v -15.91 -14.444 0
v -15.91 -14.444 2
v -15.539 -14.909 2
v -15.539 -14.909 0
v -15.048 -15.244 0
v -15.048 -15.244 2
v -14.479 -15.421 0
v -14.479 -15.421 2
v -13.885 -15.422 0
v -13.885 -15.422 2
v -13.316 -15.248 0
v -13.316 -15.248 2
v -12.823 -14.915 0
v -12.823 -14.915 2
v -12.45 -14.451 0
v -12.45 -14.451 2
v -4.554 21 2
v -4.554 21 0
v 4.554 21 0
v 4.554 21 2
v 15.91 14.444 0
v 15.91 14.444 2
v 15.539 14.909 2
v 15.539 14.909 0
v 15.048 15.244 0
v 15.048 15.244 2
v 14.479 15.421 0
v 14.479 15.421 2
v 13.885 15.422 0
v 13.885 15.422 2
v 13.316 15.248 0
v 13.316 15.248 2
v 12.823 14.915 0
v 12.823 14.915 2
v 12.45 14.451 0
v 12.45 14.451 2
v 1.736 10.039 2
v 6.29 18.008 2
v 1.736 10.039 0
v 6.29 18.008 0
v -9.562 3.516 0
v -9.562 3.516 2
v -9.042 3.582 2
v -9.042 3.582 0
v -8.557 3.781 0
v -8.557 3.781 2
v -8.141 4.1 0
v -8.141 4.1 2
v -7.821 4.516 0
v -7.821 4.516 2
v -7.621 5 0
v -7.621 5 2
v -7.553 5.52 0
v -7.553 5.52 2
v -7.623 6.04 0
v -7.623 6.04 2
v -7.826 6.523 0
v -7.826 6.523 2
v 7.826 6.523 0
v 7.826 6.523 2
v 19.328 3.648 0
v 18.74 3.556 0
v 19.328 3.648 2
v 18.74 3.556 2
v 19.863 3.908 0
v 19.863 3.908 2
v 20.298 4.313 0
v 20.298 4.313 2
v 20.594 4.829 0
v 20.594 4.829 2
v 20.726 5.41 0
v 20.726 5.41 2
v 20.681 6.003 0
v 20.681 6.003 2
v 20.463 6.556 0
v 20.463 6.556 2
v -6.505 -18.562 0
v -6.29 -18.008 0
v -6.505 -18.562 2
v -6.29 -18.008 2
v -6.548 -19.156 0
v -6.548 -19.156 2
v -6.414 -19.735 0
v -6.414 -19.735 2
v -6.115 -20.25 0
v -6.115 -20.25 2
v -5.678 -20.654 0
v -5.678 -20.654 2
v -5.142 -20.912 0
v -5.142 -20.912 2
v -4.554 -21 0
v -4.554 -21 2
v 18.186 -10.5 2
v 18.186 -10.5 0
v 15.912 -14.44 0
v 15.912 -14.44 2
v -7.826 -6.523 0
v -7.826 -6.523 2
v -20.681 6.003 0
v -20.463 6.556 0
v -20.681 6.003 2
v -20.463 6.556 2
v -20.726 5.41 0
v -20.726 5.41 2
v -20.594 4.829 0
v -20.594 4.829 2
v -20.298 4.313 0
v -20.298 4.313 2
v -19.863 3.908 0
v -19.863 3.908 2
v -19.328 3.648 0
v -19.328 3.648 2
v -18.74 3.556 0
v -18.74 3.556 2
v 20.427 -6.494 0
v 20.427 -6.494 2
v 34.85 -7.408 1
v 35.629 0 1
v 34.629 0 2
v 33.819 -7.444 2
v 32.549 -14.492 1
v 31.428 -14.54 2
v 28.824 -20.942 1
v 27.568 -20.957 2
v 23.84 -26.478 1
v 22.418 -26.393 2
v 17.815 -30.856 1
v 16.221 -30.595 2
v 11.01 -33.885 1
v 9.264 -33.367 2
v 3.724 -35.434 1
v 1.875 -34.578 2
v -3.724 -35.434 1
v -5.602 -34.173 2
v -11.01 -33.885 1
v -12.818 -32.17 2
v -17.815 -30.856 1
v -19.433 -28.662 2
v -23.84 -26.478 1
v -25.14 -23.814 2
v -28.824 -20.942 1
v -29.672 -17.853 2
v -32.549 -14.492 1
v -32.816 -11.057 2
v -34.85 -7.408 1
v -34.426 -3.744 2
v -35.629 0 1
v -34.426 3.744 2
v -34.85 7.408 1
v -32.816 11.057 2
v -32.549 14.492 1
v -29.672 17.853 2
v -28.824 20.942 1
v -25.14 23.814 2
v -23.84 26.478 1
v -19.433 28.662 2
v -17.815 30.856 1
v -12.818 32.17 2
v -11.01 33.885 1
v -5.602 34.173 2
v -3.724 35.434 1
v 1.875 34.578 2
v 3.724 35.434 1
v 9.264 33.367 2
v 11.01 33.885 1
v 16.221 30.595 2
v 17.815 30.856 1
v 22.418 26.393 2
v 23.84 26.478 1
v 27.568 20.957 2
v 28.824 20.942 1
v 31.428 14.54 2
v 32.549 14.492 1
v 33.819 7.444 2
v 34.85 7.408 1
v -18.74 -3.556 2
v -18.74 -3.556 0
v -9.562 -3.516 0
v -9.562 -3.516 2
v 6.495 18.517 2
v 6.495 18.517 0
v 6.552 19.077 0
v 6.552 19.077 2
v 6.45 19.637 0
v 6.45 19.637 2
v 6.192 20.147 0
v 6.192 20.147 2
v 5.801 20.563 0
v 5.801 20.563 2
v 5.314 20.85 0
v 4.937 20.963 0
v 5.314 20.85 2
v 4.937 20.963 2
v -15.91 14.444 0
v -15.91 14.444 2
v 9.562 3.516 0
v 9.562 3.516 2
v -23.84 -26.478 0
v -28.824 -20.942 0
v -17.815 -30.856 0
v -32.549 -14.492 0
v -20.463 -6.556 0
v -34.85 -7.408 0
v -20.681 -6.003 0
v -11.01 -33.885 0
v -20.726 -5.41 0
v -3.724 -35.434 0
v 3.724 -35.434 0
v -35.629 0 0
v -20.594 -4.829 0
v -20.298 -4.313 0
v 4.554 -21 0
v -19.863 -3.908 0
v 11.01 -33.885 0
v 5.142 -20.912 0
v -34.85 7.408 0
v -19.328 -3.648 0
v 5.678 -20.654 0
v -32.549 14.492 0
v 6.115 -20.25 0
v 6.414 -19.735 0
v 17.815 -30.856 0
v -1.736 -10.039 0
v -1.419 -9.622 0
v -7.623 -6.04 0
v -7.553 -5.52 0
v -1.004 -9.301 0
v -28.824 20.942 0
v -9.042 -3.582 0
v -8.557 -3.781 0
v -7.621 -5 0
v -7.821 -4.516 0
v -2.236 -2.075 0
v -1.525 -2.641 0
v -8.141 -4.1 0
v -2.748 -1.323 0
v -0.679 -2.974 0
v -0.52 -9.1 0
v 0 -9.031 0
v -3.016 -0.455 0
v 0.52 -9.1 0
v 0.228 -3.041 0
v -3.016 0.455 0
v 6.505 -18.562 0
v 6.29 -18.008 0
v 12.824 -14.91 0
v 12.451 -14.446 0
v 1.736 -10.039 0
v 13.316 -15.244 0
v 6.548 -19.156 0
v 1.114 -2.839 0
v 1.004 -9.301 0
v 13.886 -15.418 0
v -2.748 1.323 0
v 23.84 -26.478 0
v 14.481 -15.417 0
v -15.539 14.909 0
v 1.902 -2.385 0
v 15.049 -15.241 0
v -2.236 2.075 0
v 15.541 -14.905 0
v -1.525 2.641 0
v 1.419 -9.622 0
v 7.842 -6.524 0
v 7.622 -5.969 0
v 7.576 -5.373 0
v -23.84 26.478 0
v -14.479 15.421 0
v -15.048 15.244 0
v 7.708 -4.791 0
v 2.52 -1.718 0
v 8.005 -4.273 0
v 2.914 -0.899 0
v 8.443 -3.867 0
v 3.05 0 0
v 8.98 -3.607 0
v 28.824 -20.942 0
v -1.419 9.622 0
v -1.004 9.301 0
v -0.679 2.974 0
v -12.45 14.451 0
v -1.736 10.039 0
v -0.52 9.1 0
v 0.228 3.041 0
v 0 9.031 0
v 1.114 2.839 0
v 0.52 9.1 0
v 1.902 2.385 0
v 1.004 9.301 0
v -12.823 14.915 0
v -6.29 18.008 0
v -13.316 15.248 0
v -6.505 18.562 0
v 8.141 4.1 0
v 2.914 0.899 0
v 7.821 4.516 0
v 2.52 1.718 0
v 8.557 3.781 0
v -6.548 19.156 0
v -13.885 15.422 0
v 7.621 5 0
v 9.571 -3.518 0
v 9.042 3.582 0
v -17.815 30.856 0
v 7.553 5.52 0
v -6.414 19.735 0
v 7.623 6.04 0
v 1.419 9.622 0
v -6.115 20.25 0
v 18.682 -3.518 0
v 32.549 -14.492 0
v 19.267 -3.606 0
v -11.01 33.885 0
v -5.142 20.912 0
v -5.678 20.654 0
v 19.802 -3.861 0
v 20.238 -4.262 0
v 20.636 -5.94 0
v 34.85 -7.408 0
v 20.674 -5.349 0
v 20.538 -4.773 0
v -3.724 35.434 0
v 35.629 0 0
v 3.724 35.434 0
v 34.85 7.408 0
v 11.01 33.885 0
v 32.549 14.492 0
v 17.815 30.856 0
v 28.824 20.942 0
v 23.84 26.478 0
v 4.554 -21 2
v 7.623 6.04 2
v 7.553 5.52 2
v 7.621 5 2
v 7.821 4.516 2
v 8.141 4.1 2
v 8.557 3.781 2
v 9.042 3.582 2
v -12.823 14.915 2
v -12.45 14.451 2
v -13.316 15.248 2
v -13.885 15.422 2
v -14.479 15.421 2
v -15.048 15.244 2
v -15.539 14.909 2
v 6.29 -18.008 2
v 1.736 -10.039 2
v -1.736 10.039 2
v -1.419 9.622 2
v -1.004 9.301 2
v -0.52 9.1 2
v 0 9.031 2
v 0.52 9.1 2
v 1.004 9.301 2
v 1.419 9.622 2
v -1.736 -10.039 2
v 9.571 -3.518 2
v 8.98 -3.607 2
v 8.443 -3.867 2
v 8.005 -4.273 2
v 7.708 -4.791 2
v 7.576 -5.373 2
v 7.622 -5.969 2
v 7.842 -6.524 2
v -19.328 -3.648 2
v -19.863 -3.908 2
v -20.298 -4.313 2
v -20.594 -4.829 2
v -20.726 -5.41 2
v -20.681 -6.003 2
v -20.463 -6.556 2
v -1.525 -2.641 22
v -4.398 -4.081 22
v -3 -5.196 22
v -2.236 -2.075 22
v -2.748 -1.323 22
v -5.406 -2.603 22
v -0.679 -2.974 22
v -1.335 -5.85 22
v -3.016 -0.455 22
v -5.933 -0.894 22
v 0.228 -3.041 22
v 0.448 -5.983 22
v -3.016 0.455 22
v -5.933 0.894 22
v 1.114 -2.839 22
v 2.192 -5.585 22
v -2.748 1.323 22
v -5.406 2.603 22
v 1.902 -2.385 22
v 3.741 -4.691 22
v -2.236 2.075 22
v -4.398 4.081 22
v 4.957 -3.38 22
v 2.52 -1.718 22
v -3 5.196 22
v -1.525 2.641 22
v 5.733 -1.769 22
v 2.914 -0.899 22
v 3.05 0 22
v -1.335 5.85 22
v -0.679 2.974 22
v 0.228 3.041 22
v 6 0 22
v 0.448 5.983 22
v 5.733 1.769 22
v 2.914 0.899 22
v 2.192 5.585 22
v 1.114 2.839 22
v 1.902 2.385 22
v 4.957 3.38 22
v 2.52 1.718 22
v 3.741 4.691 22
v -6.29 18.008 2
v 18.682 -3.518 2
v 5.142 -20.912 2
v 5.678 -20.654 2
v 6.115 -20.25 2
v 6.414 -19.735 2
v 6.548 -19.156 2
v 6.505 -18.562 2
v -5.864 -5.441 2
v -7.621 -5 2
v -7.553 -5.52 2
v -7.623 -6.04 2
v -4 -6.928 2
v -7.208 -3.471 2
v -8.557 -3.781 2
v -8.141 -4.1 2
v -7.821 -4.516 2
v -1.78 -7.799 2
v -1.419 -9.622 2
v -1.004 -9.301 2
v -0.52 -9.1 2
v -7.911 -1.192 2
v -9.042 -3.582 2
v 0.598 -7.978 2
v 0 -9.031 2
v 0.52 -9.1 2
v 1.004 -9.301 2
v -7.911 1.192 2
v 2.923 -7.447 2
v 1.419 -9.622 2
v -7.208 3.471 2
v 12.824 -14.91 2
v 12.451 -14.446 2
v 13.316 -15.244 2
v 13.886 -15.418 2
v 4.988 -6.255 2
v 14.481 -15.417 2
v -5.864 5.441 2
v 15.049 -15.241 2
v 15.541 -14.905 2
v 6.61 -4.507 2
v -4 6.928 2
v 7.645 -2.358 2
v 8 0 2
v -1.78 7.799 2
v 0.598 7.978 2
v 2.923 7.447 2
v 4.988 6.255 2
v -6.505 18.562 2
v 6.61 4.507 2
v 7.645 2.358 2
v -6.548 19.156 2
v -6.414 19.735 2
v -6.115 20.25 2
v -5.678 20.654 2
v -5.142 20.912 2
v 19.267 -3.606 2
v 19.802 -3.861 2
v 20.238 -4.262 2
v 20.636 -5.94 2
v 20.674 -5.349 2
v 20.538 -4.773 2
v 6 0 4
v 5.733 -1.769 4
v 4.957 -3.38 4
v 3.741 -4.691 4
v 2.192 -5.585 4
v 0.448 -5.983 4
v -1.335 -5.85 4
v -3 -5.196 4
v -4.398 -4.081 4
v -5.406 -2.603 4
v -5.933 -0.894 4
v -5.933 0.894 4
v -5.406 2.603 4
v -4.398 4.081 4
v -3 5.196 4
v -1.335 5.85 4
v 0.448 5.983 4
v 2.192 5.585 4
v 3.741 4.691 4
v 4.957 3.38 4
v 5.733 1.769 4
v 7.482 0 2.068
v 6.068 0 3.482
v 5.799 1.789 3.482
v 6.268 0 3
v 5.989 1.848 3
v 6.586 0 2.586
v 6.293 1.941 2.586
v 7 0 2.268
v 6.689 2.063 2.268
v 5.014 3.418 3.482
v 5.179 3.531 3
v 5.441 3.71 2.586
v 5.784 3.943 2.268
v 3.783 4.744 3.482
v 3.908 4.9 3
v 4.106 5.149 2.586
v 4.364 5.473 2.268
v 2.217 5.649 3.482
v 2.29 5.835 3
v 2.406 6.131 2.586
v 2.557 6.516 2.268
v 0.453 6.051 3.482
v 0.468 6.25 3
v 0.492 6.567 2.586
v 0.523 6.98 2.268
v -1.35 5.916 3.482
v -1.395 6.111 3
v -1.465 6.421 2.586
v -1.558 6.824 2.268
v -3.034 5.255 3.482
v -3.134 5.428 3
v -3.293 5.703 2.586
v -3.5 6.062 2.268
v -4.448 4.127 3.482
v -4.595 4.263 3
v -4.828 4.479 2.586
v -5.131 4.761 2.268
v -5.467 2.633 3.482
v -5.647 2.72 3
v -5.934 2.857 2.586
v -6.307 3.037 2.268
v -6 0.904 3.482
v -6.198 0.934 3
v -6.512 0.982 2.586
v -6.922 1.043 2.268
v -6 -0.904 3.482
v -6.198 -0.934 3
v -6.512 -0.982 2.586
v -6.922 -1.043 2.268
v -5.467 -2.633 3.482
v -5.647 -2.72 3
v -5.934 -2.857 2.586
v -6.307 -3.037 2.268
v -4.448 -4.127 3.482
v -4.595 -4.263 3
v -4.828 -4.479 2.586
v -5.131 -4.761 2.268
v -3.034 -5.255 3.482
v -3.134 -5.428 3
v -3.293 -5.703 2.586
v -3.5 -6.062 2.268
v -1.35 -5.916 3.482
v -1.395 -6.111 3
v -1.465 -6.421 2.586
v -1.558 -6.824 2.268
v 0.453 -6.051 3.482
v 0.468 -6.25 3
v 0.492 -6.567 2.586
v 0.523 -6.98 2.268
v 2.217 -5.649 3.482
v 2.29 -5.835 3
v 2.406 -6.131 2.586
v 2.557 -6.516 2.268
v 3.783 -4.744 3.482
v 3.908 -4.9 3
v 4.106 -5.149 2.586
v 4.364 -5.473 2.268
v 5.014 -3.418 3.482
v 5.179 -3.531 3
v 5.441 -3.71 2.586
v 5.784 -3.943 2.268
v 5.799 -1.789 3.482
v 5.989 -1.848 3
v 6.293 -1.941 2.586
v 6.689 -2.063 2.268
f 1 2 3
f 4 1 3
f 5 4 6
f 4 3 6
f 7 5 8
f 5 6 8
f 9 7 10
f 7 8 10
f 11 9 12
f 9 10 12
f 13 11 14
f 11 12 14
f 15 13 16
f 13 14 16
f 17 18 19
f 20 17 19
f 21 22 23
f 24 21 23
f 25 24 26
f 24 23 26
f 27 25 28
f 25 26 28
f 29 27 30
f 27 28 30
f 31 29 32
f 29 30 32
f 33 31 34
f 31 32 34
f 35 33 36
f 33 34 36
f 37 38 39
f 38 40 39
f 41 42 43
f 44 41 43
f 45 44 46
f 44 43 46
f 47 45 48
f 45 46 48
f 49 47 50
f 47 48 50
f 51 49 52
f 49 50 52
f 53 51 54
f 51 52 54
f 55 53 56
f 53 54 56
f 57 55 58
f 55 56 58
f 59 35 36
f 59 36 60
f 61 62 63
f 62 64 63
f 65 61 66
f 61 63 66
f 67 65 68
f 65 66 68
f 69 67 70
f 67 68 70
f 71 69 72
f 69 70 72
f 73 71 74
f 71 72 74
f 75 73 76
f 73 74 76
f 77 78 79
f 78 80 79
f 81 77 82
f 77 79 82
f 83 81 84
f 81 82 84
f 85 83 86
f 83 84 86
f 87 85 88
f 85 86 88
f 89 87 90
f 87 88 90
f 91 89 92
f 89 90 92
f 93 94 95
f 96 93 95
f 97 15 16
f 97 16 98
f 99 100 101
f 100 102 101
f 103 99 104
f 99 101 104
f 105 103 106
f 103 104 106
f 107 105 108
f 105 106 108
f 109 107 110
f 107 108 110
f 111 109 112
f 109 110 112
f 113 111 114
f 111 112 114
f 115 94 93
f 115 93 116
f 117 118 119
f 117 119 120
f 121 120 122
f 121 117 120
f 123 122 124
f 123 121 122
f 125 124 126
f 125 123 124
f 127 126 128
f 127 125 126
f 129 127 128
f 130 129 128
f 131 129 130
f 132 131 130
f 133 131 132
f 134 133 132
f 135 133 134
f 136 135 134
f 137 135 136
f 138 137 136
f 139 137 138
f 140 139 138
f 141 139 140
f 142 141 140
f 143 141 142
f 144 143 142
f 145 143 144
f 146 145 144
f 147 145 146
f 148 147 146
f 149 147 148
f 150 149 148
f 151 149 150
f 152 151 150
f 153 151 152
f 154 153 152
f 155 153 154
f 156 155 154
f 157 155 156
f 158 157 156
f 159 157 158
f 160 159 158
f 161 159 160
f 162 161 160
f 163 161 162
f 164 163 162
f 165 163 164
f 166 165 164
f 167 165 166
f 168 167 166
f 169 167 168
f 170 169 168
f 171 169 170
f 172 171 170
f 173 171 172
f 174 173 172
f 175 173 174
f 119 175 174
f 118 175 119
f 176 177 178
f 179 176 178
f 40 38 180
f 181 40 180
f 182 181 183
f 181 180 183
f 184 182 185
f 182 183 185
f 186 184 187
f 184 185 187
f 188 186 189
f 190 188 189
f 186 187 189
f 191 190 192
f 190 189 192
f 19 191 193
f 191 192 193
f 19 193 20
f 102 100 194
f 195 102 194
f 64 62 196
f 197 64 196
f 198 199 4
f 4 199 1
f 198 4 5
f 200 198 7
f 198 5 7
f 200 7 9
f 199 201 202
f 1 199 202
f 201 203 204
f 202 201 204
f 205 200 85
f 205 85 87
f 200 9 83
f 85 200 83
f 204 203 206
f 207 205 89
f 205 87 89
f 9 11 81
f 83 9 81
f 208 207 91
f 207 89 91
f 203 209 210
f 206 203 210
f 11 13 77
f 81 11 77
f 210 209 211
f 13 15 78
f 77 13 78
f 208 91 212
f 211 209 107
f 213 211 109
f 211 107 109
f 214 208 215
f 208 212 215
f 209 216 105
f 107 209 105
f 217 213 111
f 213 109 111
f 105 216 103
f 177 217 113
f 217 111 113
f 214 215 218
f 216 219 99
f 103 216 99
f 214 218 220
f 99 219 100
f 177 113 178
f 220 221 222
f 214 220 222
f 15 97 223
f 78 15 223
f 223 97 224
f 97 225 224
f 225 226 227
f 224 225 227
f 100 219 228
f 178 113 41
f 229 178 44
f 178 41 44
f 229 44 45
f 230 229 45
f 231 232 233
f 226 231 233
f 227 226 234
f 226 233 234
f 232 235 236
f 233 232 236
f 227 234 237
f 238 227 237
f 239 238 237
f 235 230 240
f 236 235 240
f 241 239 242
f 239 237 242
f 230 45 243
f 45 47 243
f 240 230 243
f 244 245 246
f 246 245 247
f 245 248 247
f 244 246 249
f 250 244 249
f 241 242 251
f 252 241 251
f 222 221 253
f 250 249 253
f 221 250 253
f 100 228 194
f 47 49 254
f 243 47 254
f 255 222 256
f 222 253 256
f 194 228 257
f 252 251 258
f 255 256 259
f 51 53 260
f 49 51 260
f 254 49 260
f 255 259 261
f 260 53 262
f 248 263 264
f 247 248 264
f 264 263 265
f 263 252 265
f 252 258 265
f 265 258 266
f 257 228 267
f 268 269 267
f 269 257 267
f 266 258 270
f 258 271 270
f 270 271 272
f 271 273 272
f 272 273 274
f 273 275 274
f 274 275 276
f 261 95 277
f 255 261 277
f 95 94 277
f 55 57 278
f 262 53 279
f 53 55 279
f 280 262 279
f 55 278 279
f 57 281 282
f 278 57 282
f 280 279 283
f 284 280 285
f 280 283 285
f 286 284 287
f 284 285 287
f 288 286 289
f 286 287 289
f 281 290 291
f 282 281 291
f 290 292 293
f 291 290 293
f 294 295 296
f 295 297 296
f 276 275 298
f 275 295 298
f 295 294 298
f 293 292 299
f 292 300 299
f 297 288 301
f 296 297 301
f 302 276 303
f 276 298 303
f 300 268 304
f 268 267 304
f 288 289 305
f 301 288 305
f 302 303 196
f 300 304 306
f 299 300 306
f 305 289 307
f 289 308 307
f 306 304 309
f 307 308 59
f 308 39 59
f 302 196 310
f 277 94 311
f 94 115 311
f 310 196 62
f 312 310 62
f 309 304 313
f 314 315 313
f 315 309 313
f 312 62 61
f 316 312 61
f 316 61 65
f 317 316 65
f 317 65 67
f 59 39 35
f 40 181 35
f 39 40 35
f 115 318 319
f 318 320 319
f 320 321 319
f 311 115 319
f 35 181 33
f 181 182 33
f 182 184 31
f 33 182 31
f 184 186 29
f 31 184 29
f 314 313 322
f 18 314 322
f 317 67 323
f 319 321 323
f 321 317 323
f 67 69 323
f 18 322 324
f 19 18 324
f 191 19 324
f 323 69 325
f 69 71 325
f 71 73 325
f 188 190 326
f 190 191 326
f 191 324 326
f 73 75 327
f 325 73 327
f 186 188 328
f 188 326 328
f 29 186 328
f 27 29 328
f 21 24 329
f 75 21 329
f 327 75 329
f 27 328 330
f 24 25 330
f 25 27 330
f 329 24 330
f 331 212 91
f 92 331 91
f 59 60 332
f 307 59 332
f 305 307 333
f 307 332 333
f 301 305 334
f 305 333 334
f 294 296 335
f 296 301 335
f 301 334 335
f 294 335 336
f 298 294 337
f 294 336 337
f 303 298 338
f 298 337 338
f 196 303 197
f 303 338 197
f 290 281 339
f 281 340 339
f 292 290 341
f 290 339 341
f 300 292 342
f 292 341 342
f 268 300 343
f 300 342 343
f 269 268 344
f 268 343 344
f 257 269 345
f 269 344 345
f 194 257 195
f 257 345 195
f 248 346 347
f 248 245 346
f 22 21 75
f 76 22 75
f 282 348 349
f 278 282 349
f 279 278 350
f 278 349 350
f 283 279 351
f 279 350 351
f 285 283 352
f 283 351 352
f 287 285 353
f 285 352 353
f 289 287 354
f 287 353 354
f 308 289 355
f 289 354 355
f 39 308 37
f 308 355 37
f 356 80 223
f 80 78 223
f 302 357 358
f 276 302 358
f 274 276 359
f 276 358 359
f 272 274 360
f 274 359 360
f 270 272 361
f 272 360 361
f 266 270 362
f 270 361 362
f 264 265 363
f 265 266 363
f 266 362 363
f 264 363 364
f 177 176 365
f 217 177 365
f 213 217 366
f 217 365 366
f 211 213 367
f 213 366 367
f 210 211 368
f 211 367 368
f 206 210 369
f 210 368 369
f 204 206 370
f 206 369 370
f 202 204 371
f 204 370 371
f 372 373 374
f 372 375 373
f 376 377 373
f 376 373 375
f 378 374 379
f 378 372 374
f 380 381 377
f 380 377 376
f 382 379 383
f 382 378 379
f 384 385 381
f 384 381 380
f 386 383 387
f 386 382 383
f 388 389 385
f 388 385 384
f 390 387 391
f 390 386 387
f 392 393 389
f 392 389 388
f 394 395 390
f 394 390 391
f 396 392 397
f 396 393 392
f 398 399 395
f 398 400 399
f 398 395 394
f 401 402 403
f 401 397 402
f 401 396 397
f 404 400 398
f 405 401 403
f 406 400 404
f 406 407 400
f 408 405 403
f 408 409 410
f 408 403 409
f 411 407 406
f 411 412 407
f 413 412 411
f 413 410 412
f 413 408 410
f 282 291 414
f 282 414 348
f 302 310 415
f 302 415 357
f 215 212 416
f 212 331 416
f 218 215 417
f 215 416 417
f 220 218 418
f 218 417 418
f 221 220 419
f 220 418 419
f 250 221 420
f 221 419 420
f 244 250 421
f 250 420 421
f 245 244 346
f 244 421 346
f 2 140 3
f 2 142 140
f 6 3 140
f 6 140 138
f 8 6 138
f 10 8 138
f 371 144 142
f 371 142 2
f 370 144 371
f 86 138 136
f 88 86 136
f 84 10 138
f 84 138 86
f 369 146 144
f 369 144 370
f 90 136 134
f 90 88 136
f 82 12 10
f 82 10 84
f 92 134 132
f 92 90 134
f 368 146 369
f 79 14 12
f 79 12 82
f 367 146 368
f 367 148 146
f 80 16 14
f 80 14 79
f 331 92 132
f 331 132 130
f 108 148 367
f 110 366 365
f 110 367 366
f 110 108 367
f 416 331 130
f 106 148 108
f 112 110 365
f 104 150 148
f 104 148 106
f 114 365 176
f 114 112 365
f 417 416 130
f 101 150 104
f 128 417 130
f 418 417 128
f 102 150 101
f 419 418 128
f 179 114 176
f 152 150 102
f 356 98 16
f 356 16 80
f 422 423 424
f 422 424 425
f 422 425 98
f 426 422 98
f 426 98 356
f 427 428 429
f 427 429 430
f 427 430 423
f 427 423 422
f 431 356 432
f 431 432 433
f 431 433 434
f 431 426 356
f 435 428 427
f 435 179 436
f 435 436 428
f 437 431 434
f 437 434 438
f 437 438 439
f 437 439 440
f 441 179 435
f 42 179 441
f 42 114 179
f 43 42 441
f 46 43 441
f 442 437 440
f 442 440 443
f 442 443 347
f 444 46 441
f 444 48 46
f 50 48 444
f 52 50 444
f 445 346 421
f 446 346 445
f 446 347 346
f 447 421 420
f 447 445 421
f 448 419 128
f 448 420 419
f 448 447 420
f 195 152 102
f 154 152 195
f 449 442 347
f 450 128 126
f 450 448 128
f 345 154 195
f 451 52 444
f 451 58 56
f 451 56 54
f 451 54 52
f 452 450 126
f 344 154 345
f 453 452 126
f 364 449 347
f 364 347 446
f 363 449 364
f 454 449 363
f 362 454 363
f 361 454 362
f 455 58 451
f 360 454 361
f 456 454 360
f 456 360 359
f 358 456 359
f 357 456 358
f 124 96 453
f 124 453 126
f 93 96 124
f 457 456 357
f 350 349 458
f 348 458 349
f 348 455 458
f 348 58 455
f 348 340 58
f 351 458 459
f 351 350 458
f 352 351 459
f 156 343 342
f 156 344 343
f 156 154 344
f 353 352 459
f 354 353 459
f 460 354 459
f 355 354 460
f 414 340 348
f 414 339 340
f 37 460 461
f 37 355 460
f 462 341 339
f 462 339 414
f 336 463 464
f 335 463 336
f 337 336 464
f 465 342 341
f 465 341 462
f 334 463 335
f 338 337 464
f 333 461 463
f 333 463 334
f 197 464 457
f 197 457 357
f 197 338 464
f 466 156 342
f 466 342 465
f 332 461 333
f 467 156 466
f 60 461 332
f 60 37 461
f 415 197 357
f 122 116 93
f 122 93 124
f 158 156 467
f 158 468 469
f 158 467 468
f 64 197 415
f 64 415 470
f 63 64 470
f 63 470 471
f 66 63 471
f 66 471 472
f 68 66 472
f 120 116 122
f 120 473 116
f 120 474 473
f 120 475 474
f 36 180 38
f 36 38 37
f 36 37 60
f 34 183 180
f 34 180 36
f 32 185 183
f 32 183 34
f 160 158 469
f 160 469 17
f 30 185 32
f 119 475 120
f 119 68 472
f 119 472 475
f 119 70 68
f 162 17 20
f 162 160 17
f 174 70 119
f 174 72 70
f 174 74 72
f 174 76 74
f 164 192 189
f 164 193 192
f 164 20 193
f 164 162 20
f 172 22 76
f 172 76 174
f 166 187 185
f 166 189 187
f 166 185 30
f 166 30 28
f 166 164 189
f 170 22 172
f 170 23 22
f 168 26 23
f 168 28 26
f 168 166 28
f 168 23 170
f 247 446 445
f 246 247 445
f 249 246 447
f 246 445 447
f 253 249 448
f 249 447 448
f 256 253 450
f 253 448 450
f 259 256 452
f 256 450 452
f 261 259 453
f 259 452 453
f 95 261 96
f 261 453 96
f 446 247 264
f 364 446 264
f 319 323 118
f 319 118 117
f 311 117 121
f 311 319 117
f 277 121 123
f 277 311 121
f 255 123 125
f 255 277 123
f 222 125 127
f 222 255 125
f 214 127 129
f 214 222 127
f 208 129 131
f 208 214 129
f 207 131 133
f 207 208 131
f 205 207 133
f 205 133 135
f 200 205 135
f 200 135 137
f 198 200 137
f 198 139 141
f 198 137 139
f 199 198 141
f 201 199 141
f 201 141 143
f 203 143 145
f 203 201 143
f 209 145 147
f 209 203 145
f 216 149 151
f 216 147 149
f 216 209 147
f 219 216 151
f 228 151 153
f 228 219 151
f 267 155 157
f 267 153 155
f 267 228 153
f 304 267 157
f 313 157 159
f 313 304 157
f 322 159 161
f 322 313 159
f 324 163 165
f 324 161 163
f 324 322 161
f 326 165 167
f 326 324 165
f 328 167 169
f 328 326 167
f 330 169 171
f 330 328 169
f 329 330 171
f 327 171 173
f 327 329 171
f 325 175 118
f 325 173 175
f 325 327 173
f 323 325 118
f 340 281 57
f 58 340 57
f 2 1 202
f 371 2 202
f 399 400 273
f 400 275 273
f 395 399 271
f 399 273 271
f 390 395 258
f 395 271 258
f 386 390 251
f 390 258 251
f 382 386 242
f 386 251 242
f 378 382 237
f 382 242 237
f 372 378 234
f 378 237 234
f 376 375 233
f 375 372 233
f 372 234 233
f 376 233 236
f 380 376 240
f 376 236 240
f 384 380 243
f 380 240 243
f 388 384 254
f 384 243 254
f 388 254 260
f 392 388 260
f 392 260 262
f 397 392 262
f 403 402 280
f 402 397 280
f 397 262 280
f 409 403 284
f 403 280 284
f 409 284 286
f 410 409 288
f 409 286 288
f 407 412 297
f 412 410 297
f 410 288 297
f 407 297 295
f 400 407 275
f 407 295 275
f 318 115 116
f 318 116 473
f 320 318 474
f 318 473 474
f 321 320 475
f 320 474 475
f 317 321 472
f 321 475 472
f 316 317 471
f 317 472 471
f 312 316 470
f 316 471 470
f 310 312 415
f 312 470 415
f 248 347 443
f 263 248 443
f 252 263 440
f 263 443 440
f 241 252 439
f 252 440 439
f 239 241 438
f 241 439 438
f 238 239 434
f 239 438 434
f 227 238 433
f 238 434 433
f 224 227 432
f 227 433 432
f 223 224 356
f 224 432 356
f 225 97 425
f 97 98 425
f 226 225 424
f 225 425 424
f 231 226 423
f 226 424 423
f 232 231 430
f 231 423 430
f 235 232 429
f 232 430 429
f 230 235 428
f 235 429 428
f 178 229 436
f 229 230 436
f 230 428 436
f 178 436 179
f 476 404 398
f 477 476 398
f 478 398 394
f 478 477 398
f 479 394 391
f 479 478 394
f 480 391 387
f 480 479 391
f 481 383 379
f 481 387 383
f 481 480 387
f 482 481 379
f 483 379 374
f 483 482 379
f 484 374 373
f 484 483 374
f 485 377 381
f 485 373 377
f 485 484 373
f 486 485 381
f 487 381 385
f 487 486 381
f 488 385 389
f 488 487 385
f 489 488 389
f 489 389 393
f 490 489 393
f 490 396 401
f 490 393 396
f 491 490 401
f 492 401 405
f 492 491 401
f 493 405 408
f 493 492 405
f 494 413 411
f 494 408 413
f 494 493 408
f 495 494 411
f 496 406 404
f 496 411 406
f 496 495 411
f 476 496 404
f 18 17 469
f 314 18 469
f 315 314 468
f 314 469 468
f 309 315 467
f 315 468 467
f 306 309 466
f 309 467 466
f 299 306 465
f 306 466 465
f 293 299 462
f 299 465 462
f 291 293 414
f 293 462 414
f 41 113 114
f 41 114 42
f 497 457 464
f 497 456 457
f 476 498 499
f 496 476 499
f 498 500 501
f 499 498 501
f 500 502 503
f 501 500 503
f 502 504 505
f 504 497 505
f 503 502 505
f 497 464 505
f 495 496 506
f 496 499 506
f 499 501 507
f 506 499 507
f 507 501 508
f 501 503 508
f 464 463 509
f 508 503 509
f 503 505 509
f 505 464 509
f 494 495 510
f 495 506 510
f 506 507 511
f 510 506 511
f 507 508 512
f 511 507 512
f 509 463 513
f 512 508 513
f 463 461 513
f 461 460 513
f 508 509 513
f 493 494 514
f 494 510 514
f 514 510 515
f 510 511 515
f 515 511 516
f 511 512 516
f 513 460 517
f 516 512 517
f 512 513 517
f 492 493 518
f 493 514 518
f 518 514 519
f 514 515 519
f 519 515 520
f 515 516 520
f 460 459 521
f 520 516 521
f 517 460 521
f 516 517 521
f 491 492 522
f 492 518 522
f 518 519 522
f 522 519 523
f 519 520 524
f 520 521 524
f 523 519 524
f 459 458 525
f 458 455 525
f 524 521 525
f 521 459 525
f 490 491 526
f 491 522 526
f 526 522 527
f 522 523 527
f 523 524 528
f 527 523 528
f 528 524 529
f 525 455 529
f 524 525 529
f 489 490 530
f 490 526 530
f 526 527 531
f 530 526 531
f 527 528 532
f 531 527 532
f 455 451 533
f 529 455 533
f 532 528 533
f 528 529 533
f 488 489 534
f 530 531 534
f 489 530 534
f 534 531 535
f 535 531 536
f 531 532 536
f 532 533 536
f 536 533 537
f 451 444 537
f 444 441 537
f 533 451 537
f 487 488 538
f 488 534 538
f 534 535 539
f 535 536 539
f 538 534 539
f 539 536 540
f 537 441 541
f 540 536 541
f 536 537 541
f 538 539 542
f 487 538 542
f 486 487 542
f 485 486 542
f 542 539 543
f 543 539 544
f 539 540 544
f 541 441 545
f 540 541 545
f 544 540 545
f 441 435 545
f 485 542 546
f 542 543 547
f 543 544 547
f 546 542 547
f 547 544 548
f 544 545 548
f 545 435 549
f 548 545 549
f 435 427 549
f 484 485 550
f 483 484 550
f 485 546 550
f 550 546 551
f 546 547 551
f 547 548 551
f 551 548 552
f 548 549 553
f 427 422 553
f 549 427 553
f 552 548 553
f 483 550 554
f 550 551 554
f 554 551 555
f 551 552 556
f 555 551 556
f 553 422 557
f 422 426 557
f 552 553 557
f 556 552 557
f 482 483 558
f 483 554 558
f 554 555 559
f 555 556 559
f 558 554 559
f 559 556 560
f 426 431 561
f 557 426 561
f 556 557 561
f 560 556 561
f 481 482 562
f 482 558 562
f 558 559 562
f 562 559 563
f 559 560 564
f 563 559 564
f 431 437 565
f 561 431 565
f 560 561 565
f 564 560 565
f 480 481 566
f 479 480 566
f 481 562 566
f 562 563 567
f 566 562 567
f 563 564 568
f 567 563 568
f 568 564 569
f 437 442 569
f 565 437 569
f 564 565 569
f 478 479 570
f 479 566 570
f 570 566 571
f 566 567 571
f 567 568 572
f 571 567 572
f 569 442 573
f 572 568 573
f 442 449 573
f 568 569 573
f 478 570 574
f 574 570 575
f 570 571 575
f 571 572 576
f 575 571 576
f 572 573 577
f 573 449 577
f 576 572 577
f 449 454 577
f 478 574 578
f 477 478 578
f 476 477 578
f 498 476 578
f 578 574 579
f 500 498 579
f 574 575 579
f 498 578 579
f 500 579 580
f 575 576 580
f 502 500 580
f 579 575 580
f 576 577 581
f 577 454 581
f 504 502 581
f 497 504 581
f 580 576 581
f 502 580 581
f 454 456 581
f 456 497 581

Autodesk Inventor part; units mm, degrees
sketch "Sketch1" plane through (0, 0, 0) normal (0, 0, 1) x (1, 0, 0)
  line L0 (0, 2.8582) -> (0, -2.8582) construction
  line L1 (-5.7775, 0) -> (5.7775, 0) construction
  circle A0 centre (0, 0) radius 35.629
  circle A1 centre (0, 0) radius 4
  line L2 (0, 4) -> (0, 7)
  line L3 (0, 7) -> (0, 21)
  line L4 (0, 21) -> (5, 21)
  line L5 (5, 21) -> (8, 21)
  line L6 (8, 21) -> (0, 7)
  line L7 (0, 21) -> (-8, 21)
  line L8 (-8, 21) -> (0, 7)
  line L9 (0, -4) -> (0, -7)
  line L10 (0, -7) -> (0, -21)
  line L11 (0, -21) -> (8, -21)
  line L12 (8, -21) -> (0, -7)
  line L13 (0, -21) -> (-8, -21)
  line L14 (-8, -21) -> (0, -7)
  line L15 (0, 0) -> (2.5981, 1.5)
  line L16 (0, 0) -> (3, 0) construction
  line L17 (2.5981, 1.5) -> (3.4641, 2)
  line L18 (3.4641, 2) -> (6.0622, 3.5)
  line L19 (6.0622, 3.5) -> (18.1865, 10.5)
  line L20 (18.1865, 10.5) -> (14.1865, 17.4282)
  line L21 (14.1865, 17.4282) -> (6.0622, 3.5)
  line L22 (18.1865, 10.5) -> (22.1865, 3.5718)
  line L23 (22.1865, 3.5718) -> (6.0622, 3.5)
  line L24 (0, 0) -> (8, 0) construction
  line L25 (0, 0) -> (3.4641, -2)
  line L26 (0, 0) -> (4, 0) construction
  line L27 (3.4641, -2) -> (6.0622, -3.5)
  line L28 (6.0622, -3.5) -> (18.1865, -10.5)
  line L29 (18.1865, -10.5) -> (14.1865, -17.4282)
  line L30 (14.1865, -17.4282) -> (6.0934, -3.518)
  line L31 (18.1865, -10.5) -> (22.0919, -3.518)
  line L32 (22.0919, -3.518) -> (6.0934, -3.518)
  line L33 (0, 0) -> (-2.5981, 1.5)
  line L34 (0, 0) -> (3, 0) construction
  line L35 (-2.5981, 1.5) -> (-3.4641, 2)
  line L36 (-3.4641, 2) -> (-6.0622, 3.5)
  line L37 (-6.0622, 3.5) -> (-18.1865, 10.5)
  line L38 (-18.1865, 10.5) -> (-14.1865, 17.4282)
  line L39 (-14.1865, 17.4282) -> (-6.0622, 3.5)
  line L40 (-18.1865, 10.5) -> (-22.1865, 3.5718)
  line L41 (-22.1865, 3.5718) -> (-6.0622, 3.5)
  line L42 (0, 0) -> (-6.0622, -3.5)
  line L43 (0, 0) -> (7, 0) construction
  line L44 (-6.0622, -3.5) -> (-18.1865, -10.5)
  line L45 (-18.1865, -10.5) -> (-14.1865, -17.4282)
  line L46 (-14.1865, -17.4282) -> (-6.0622, -3.5)
  line L47 (-18.1865, -10.5) -> (-22.1865, -3.5718)
  line L48 (-22.1865, -3.5718) -> (-6.0622, -3.5)
  dimension "d0" = 71.258
  dimension "d1" = 8
  dimension "d2" = 3
  dimension "d3" = 14
  dimension "d4" = 5
  dimension "d5" = 3
  dimension "d6" = 8
  dimension "d7" = 3
  dimension "d8" = 14
  dimension "d9" = 8
  dimension "d10" = 8
  dimension "d11" = 3
  dimension "d12" = 30
  dimension "d13" = 3
  dimension "d14" = 14
  dimension "d15" = 8
  dimension "d16" = 8
  dimension "d19" = 4
  dimension "d20" = 30
  dimension "d21" = 3
  dimension "d22" = 14
  dimension "d23" = 8
  dimension "d24" = 8
  dimension "d25" = 3
  dimension "d26" = 150
  dimension "d27" = 1
  dimension "d28" = 180
  dimension "d29" = 3
  dimension "d30" = 180
  dimension "d31" = 180
  dimension "d32" = 8
  dimension "d33" = 8
  dimension "d34" = 7
  dimension "d35" = 150
  dimension "d36" = 14
  dimension "d37" = 180
  dimension "d38" = 8
  dimension "d39" = 8
extrude "Extrusion1" add sketch "Sketch1" along normal blind 2
fillet "Fillet1" radius 2 18 edges at (14.1865, 17.4282, 1) (22.1865, 3.5718, 1) (6.0622, 3.5, 1) (22.0919, -3.518, 1) (14.1865, -17.4282, 1) (6.0934, -3.518, 1) (0, 7, 1) (-8, 21, 1) (8, 21, 1) (-6.0622, 3.5, 1) (-22.1865, 3.5718, 1) (-14.1865, 17.4282, 1) (-6.0622, -3.5, 1) (-14.1865, -17.4282, 1) (-22.1865, -3.5718, 1) (-8, -21, 1) (0, -7, 1) (8, -21, 1)
sketch "Sketch2" plane through (0, 0, 2) normal (0, 0, 1) x (1, 0, 0)
  circle A0 centre (0, 0) radius 3.05
  circle A1 centre (0, 0) radius 5
  dimension "d43" = 6.1
  dimension "d49" = 10
extrude "Extrusion2" add sketch "Sketch2" against normal blind 2
chamfer "Chamfer1" distance 1 angle 45 1 edges at (-35.629, 0, 2)
sketch "Sketch4" plane through (0, 0, 2) normal (0, 0, 1) x (1, 0, 0)
  circle A0 centre (0, 0) radius 3.05
  circle A1 centre (0, 0) radius 6
  dimension "d54" = 6.1
  dimension "d55" = 12
extrude "Extrusion4" add sketch "Sketch4" along normal blind 20
fillet "Fillet2" radius 2 1 edges at (-6, 0, 2)
properties part number "Wiel hout+spacer x 20mm" material "S235"
